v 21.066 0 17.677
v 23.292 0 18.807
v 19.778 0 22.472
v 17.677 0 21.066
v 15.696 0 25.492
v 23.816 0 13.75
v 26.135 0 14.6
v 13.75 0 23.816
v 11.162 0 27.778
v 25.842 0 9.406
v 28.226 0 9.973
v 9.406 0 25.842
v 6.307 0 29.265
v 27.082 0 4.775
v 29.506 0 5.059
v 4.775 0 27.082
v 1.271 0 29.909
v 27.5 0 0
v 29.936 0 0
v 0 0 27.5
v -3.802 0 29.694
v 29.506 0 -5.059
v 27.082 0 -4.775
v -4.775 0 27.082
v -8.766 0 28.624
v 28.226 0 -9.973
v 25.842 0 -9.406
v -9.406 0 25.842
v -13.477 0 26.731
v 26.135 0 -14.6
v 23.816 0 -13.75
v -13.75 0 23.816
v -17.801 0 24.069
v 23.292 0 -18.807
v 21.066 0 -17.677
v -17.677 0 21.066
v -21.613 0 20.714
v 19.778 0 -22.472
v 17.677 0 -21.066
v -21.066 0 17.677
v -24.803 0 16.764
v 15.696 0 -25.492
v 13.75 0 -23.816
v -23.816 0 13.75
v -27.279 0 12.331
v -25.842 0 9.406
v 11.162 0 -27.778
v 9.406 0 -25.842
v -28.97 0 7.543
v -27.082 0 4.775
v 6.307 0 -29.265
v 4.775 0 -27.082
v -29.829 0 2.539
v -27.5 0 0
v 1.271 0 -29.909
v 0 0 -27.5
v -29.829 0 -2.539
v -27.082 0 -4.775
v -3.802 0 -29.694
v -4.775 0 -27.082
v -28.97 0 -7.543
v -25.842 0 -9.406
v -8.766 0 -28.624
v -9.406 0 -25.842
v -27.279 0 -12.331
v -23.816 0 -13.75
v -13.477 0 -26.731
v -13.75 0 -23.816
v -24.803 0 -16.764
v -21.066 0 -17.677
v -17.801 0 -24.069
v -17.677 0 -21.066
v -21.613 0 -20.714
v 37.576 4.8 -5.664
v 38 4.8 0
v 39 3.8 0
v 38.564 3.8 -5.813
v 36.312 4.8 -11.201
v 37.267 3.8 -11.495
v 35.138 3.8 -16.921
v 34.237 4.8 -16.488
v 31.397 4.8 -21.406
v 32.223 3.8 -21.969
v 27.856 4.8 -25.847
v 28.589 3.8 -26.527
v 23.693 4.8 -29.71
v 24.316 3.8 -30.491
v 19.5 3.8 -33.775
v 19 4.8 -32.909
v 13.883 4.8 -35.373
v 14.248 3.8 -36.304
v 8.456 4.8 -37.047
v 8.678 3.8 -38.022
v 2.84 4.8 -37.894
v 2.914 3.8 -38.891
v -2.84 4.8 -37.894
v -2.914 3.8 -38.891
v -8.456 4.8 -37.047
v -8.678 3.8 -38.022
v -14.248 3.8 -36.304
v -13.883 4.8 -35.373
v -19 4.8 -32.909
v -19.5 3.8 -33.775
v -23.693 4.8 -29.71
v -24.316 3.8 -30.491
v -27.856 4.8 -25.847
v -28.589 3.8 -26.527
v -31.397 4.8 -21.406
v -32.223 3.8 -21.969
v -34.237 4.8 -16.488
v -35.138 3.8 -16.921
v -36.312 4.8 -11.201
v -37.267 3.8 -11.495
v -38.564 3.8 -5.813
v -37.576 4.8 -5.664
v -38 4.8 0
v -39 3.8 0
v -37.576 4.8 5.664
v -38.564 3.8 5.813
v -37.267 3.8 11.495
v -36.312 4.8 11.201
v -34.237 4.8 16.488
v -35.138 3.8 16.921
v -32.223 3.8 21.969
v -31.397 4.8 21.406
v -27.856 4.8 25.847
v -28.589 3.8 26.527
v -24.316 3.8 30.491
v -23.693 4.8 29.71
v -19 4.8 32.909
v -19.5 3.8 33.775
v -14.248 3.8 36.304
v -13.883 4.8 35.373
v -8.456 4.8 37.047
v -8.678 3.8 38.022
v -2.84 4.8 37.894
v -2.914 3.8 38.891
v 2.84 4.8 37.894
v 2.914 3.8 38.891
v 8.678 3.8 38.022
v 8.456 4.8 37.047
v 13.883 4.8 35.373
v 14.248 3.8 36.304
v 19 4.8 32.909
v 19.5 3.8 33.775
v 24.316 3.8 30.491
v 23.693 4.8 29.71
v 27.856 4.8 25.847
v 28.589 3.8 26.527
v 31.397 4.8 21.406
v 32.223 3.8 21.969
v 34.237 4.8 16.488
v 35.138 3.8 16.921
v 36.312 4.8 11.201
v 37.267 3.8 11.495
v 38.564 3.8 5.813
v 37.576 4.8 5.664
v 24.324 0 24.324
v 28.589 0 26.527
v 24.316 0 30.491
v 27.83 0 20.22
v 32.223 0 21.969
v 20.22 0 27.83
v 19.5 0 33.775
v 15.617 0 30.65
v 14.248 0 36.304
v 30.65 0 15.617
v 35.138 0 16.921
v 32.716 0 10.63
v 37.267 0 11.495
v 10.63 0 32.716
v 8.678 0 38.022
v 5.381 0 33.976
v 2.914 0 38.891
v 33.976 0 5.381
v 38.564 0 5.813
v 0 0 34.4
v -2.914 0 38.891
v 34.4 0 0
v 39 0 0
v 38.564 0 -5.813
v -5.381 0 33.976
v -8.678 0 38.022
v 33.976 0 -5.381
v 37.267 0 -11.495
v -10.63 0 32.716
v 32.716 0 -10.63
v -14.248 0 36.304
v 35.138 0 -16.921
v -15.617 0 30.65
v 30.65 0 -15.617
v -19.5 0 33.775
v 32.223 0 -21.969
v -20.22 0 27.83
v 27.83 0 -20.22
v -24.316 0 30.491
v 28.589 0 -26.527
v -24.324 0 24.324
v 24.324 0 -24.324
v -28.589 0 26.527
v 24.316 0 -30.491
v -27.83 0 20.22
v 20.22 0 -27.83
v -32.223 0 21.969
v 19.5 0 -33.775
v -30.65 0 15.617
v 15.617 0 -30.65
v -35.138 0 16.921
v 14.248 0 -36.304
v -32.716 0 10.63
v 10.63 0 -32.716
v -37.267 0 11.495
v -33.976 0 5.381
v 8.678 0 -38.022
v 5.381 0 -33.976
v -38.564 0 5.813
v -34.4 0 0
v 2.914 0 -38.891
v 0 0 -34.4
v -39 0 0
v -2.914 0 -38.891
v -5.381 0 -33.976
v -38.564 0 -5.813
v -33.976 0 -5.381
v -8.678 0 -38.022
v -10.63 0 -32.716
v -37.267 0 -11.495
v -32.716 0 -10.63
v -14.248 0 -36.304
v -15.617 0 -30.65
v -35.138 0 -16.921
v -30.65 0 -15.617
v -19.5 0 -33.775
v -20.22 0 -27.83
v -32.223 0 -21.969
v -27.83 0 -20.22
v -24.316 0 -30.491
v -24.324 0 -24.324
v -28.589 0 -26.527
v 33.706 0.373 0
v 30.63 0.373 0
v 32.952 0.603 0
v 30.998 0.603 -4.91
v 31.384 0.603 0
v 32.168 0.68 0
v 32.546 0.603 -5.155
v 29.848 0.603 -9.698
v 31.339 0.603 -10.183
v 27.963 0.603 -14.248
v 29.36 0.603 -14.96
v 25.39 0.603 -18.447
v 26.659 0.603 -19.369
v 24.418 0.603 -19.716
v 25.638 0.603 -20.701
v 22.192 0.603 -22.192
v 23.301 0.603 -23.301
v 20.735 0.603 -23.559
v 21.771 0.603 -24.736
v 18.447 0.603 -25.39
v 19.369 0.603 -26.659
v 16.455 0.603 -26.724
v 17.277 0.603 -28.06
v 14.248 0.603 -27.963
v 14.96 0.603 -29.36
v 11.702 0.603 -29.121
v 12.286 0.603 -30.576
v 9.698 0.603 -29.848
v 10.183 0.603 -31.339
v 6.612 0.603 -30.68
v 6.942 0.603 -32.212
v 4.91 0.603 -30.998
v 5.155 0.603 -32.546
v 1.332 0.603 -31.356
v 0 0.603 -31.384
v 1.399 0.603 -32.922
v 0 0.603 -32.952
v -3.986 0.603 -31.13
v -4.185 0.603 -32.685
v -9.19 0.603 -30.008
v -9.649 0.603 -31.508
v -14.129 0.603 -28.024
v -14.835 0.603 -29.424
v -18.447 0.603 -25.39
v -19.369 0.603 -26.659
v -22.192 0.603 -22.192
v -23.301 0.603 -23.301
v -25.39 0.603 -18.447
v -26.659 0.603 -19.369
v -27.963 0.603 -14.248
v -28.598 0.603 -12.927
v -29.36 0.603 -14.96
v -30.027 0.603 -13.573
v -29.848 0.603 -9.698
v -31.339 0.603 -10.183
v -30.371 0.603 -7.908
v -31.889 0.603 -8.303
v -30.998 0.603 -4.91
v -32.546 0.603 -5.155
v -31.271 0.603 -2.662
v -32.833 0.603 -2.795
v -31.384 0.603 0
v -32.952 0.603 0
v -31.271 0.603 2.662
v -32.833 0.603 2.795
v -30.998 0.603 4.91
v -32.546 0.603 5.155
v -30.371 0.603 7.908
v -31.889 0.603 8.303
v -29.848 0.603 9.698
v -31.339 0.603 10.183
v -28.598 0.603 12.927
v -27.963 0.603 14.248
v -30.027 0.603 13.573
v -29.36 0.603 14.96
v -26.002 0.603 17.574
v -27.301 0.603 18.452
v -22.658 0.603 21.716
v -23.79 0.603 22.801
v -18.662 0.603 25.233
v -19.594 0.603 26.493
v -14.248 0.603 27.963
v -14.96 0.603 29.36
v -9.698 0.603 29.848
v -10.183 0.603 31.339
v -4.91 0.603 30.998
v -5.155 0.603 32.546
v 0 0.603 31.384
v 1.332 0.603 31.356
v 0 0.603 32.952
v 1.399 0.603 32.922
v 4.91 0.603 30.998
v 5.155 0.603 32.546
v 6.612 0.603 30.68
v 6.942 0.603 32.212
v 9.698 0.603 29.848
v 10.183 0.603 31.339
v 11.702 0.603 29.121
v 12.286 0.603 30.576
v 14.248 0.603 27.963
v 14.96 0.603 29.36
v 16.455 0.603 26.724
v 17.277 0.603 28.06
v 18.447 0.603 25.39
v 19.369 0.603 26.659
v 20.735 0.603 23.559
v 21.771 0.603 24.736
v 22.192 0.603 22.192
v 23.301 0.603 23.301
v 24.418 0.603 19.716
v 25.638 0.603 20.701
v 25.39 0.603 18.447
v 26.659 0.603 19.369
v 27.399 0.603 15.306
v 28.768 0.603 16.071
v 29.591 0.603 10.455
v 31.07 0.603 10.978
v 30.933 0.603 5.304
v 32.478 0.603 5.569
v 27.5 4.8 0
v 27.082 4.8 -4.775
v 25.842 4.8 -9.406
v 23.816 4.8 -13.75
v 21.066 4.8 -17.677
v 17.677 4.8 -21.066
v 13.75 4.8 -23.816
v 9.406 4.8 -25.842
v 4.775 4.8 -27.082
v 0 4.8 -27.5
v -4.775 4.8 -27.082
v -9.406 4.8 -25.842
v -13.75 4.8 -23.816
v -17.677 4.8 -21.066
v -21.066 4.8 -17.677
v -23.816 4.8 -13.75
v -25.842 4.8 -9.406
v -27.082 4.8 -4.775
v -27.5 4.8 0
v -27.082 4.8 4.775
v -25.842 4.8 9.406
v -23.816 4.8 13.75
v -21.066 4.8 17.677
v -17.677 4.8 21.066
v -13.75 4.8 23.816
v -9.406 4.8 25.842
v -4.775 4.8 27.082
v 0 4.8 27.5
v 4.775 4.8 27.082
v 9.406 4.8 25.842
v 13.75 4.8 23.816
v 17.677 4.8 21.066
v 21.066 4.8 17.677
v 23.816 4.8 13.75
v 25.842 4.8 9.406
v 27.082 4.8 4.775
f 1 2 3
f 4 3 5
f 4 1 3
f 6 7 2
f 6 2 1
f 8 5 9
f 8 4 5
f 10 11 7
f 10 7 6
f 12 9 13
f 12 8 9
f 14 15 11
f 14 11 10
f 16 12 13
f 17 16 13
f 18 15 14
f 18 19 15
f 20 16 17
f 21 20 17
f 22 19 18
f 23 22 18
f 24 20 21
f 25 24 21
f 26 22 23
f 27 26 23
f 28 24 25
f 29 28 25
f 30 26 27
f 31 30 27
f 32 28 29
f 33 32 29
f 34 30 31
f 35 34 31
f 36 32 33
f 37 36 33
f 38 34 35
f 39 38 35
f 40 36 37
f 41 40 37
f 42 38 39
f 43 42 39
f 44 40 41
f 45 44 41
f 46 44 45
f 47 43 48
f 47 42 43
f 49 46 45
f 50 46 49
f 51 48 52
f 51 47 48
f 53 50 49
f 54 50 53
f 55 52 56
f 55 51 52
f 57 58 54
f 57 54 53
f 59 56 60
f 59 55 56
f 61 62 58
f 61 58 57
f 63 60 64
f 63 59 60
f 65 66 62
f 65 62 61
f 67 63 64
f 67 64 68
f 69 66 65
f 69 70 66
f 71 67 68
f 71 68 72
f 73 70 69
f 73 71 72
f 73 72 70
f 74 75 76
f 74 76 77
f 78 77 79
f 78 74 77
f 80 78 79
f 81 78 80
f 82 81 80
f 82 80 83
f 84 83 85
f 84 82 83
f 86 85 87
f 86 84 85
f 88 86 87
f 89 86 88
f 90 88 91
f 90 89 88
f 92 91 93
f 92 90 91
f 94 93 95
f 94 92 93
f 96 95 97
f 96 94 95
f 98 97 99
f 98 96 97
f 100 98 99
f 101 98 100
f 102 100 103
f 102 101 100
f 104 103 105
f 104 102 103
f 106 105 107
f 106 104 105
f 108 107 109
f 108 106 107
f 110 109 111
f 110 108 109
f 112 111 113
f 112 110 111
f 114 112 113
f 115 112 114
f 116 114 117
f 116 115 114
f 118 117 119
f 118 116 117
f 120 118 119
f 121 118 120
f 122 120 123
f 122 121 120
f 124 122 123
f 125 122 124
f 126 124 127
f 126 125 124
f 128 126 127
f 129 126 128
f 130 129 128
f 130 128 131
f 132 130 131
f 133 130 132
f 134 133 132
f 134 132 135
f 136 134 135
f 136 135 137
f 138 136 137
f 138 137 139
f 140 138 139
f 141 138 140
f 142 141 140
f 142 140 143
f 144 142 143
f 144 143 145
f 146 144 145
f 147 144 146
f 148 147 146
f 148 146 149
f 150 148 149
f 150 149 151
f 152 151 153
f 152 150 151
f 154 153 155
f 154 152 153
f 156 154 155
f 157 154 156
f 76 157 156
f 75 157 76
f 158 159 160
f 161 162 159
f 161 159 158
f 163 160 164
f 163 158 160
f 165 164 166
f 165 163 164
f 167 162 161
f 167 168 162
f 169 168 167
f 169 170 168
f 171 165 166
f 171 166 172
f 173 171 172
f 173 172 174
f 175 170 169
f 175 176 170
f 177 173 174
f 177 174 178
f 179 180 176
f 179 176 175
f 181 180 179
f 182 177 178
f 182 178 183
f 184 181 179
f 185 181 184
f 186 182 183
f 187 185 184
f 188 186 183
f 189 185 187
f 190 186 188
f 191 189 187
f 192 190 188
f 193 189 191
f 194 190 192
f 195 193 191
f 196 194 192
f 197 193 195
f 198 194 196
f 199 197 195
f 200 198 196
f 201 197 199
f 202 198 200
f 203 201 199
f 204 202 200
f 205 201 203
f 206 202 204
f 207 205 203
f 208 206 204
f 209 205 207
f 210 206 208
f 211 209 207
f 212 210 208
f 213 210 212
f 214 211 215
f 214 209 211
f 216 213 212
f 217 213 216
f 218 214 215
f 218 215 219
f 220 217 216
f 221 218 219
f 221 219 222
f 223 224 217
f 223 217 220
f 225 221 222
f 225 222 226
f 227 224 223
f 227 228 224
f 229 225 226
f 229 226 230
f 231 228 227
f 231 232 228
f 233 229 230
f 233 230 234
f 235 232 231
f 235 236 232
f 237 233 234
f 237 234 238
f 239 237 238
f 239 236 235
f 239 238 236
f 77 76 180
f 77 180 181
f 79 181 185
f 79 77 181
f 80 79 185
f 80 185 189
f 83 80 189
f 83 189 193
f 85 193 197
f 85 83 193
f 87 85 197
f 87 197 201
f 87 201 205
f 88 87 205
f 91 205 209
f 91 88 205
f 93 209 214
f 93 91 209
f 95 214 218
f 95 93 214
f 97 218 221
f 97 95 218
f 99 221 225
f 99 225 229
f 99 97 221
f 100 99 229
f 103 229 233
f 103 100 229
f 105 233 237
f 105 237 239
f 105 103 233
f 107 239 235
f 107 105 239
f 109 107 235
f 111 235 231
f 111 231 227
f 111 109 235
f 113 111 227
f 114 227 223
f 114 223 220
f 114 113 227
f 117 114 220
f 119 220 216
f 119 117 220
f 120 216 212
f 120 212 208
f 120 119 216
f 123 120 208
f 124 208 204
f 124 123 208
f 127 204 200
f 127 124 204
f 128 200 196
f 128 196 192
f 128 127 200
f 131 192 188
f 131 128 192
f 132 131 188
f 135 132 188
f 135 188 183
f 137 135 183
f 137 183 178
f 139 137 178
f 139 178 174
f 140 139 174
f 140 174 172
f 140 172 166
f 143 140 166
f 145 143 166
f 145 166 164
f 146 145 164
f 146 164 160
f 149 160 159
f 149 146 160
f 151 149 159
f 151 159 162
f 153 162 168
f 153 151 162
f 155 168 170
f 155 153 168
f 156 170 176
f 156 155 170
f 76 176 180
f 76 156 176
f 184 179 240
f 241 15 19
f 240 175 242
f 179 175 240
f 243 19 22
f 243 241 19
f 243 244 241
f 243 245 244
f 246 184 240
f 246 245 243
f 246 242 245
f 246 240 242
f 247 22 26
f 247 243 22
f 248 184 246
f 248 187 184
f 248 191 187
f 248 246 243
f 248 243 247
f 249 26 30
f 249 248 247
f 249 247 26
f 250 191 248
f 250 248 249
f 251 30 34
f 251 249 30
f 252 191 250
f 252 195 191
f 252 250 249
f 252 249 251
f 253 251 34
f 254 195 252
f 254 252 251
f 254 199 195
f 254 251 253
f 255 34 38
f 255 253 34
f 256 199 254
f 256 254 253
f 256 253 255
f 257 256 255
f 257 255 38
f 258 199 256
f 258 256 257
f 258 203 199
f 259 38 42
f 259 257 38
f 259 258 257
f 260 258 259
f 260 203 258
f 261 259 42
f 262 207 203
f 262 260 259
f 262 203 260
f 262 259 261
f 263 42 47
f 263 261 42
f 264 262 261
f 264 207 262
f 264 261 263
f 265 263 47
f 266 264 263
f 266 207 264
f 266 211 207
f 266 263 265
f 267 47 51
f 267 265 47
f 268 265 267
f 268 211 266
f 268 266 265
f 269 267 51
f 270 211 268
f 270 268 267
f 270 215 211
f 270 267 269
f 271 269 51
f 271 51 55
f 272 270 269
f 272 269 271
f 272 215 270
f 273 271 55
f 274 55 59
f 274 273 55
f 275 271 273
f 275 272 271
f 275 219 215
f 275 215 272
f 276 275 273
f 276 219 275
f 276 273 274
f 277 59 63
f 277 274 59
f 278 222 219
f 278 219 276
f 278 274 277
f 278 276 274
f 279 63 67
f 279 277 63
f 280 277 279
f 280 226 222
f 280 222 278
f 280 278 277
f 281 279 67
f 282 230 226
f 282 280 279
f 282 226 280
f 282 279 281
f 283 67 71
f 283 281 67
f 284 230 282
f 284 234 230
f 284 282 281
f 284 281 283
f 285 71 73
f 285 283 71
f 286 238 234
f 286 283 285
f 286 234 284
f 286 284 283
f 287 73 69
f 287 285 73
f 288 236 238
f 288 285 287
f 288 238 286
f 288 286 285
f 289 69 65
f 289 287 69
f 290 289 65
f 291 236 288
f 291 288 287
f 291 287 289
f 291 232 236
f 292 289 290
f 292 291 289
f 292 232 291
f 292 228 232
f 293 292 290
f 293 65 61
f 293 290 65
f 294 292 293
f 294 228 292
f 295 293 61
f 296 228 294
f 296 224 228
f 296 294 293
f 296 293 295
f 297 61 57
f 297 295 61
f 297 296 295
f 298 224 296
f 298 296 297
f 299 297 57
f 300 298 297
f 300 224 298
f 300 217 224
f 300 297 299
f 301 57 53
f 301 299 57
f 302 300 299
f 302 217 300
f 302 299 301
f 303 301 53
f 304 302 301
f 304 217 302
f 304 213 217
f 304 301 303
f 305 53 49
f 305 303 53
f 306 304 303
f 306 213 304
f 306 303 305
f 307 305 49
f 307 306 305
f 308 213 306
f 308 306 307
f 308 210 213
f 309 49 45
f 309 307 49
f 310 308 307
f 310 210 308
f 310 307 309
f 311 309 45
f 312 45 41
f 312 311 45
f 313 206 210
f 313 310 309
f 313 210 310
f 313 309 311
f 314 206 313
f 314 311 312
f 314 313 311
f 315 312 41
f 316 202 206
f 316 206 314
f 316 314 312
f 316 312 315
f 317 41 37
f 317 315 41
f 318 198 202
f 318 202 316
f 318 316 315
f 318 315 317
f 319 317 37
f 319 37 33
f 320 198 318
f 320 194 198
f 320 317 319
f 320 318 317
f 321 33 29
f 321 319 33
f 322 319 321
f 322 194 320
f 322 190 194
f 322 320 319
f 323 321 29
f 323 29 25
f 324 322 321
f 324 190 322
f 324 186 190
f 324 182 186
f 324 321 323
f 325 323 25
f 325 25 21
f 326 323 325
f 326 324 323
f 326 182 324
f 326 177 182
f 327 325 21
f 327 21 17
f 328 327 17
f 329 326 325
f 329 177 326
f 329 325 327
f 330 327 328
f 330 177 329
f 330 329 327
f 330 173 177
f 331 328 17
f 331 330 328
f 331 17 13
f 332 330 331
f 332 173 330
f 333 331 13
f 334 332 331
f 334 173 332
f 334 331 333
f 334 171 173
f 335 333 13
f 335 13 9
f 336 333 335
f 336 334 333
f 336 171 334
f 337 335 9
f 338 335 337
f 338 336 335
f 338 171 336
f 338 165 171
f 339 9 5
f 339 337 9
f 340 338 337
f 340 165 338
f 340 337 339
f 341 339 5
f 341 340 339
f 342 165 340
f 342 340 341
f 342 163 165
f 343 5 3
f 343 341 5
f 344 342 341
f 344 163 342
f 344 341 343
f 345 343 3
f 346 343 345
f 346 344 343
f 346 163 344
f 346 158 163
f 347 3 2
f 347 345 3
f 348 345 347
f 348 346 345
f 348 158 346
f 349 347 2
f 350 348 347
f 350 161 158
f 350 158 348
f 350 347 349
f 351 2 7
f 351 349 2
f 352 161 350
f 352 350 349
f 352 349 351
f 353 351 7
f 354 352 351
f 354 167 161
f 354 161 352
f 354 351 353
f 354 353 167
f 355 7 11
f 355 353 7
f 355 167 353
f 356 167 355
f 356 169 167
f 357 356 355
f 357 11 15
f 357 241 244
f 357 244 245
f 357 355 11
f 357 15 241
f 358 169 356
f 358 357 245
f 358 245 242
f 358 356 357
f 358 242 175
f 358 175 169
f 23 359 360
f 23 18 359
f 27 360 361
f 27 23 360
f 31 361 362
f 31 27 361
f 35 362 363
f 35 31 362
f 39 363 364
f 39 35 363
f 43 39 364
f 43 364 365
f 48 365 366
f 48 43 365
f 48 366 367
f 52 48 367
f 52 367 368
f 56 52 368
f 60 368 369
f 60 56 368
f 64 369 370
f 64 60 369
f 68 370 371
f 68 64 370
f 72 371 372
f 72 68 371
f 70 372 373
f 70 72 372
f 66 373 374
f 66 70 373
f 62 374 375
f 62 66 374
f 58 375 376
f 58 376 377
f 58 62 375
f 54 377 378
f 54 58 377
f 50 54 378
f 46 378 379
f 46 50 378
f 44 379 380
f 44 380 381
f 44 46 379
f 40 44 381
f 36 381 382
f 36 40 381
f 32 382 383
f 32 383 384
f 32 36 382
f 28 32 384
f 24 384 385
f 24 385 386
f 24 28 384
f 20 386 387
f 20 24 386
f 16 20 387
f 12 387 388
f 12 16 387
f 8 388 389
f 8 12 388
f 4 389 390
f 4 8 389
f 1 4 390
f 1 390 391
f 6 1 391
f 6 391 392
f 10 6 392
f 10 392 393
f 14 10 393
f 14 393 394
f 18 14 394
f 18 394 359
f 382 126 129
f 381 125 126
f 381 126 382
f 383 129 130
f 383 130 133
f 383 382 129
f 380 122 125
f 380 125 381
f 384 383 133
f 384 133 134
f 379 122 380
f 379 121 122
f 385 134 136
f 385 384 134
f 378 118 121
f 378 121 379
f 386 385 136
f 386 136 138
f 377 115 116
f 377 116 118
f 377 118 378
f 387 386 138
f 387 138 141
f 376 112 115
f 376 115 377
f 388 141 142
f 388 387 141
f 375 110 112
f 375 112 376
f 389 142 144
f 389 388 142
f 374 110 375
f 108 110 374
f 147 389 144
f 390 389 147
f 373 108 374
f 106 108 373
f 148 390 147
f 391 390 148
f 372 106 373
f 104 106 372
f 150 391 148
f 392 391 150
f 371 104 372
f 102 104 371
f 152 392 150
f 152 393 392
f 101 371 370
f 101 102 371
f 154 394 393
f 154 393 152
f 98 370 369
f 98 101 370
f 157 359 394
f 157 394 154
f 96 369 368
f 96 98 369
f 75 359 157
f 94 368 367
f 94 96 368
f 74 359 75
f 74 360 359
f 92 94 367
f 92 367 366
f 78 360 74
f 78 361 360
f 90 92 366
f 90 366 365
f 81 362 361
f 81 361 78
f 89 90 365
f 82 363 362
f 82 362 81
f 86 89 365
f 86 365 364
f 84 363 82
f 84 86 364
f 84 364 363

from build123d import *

# Parameters (mm, degrees)
CHAMFER1_SIZE = 1


with BuildPart() as part:
    # Sketch1 → Revolve1 (revolve)
    with BuildSketch(Plane.XY):
        with BuildLine():
            Line((27.5, 0), (29.936442743, 0))
            ThreePointArc((29.936442743, 0), (32.167974855, 0.680321637), (34.399506968, 0))
            Line((34.399506968, 0), (39, 0))
            Line((39, 0), (39, 4.8))
            Line((39, 4.8), (27.5, 4.8))
            Line((27.5, 4.8), (27.5, 0))
        make_face()
    revolve(axis=Axis((0, 0, 0), (0, 1, 0)))

    # Chamfer1
    chamfer1_edges = [part.edges().sort_by_distance(p)[0] for p in [
        (-39, 4.8, 0),
    ]]
    chamfer(chamfer1_edges, length=CHAMFER1_SIZE)


solid = part.part
